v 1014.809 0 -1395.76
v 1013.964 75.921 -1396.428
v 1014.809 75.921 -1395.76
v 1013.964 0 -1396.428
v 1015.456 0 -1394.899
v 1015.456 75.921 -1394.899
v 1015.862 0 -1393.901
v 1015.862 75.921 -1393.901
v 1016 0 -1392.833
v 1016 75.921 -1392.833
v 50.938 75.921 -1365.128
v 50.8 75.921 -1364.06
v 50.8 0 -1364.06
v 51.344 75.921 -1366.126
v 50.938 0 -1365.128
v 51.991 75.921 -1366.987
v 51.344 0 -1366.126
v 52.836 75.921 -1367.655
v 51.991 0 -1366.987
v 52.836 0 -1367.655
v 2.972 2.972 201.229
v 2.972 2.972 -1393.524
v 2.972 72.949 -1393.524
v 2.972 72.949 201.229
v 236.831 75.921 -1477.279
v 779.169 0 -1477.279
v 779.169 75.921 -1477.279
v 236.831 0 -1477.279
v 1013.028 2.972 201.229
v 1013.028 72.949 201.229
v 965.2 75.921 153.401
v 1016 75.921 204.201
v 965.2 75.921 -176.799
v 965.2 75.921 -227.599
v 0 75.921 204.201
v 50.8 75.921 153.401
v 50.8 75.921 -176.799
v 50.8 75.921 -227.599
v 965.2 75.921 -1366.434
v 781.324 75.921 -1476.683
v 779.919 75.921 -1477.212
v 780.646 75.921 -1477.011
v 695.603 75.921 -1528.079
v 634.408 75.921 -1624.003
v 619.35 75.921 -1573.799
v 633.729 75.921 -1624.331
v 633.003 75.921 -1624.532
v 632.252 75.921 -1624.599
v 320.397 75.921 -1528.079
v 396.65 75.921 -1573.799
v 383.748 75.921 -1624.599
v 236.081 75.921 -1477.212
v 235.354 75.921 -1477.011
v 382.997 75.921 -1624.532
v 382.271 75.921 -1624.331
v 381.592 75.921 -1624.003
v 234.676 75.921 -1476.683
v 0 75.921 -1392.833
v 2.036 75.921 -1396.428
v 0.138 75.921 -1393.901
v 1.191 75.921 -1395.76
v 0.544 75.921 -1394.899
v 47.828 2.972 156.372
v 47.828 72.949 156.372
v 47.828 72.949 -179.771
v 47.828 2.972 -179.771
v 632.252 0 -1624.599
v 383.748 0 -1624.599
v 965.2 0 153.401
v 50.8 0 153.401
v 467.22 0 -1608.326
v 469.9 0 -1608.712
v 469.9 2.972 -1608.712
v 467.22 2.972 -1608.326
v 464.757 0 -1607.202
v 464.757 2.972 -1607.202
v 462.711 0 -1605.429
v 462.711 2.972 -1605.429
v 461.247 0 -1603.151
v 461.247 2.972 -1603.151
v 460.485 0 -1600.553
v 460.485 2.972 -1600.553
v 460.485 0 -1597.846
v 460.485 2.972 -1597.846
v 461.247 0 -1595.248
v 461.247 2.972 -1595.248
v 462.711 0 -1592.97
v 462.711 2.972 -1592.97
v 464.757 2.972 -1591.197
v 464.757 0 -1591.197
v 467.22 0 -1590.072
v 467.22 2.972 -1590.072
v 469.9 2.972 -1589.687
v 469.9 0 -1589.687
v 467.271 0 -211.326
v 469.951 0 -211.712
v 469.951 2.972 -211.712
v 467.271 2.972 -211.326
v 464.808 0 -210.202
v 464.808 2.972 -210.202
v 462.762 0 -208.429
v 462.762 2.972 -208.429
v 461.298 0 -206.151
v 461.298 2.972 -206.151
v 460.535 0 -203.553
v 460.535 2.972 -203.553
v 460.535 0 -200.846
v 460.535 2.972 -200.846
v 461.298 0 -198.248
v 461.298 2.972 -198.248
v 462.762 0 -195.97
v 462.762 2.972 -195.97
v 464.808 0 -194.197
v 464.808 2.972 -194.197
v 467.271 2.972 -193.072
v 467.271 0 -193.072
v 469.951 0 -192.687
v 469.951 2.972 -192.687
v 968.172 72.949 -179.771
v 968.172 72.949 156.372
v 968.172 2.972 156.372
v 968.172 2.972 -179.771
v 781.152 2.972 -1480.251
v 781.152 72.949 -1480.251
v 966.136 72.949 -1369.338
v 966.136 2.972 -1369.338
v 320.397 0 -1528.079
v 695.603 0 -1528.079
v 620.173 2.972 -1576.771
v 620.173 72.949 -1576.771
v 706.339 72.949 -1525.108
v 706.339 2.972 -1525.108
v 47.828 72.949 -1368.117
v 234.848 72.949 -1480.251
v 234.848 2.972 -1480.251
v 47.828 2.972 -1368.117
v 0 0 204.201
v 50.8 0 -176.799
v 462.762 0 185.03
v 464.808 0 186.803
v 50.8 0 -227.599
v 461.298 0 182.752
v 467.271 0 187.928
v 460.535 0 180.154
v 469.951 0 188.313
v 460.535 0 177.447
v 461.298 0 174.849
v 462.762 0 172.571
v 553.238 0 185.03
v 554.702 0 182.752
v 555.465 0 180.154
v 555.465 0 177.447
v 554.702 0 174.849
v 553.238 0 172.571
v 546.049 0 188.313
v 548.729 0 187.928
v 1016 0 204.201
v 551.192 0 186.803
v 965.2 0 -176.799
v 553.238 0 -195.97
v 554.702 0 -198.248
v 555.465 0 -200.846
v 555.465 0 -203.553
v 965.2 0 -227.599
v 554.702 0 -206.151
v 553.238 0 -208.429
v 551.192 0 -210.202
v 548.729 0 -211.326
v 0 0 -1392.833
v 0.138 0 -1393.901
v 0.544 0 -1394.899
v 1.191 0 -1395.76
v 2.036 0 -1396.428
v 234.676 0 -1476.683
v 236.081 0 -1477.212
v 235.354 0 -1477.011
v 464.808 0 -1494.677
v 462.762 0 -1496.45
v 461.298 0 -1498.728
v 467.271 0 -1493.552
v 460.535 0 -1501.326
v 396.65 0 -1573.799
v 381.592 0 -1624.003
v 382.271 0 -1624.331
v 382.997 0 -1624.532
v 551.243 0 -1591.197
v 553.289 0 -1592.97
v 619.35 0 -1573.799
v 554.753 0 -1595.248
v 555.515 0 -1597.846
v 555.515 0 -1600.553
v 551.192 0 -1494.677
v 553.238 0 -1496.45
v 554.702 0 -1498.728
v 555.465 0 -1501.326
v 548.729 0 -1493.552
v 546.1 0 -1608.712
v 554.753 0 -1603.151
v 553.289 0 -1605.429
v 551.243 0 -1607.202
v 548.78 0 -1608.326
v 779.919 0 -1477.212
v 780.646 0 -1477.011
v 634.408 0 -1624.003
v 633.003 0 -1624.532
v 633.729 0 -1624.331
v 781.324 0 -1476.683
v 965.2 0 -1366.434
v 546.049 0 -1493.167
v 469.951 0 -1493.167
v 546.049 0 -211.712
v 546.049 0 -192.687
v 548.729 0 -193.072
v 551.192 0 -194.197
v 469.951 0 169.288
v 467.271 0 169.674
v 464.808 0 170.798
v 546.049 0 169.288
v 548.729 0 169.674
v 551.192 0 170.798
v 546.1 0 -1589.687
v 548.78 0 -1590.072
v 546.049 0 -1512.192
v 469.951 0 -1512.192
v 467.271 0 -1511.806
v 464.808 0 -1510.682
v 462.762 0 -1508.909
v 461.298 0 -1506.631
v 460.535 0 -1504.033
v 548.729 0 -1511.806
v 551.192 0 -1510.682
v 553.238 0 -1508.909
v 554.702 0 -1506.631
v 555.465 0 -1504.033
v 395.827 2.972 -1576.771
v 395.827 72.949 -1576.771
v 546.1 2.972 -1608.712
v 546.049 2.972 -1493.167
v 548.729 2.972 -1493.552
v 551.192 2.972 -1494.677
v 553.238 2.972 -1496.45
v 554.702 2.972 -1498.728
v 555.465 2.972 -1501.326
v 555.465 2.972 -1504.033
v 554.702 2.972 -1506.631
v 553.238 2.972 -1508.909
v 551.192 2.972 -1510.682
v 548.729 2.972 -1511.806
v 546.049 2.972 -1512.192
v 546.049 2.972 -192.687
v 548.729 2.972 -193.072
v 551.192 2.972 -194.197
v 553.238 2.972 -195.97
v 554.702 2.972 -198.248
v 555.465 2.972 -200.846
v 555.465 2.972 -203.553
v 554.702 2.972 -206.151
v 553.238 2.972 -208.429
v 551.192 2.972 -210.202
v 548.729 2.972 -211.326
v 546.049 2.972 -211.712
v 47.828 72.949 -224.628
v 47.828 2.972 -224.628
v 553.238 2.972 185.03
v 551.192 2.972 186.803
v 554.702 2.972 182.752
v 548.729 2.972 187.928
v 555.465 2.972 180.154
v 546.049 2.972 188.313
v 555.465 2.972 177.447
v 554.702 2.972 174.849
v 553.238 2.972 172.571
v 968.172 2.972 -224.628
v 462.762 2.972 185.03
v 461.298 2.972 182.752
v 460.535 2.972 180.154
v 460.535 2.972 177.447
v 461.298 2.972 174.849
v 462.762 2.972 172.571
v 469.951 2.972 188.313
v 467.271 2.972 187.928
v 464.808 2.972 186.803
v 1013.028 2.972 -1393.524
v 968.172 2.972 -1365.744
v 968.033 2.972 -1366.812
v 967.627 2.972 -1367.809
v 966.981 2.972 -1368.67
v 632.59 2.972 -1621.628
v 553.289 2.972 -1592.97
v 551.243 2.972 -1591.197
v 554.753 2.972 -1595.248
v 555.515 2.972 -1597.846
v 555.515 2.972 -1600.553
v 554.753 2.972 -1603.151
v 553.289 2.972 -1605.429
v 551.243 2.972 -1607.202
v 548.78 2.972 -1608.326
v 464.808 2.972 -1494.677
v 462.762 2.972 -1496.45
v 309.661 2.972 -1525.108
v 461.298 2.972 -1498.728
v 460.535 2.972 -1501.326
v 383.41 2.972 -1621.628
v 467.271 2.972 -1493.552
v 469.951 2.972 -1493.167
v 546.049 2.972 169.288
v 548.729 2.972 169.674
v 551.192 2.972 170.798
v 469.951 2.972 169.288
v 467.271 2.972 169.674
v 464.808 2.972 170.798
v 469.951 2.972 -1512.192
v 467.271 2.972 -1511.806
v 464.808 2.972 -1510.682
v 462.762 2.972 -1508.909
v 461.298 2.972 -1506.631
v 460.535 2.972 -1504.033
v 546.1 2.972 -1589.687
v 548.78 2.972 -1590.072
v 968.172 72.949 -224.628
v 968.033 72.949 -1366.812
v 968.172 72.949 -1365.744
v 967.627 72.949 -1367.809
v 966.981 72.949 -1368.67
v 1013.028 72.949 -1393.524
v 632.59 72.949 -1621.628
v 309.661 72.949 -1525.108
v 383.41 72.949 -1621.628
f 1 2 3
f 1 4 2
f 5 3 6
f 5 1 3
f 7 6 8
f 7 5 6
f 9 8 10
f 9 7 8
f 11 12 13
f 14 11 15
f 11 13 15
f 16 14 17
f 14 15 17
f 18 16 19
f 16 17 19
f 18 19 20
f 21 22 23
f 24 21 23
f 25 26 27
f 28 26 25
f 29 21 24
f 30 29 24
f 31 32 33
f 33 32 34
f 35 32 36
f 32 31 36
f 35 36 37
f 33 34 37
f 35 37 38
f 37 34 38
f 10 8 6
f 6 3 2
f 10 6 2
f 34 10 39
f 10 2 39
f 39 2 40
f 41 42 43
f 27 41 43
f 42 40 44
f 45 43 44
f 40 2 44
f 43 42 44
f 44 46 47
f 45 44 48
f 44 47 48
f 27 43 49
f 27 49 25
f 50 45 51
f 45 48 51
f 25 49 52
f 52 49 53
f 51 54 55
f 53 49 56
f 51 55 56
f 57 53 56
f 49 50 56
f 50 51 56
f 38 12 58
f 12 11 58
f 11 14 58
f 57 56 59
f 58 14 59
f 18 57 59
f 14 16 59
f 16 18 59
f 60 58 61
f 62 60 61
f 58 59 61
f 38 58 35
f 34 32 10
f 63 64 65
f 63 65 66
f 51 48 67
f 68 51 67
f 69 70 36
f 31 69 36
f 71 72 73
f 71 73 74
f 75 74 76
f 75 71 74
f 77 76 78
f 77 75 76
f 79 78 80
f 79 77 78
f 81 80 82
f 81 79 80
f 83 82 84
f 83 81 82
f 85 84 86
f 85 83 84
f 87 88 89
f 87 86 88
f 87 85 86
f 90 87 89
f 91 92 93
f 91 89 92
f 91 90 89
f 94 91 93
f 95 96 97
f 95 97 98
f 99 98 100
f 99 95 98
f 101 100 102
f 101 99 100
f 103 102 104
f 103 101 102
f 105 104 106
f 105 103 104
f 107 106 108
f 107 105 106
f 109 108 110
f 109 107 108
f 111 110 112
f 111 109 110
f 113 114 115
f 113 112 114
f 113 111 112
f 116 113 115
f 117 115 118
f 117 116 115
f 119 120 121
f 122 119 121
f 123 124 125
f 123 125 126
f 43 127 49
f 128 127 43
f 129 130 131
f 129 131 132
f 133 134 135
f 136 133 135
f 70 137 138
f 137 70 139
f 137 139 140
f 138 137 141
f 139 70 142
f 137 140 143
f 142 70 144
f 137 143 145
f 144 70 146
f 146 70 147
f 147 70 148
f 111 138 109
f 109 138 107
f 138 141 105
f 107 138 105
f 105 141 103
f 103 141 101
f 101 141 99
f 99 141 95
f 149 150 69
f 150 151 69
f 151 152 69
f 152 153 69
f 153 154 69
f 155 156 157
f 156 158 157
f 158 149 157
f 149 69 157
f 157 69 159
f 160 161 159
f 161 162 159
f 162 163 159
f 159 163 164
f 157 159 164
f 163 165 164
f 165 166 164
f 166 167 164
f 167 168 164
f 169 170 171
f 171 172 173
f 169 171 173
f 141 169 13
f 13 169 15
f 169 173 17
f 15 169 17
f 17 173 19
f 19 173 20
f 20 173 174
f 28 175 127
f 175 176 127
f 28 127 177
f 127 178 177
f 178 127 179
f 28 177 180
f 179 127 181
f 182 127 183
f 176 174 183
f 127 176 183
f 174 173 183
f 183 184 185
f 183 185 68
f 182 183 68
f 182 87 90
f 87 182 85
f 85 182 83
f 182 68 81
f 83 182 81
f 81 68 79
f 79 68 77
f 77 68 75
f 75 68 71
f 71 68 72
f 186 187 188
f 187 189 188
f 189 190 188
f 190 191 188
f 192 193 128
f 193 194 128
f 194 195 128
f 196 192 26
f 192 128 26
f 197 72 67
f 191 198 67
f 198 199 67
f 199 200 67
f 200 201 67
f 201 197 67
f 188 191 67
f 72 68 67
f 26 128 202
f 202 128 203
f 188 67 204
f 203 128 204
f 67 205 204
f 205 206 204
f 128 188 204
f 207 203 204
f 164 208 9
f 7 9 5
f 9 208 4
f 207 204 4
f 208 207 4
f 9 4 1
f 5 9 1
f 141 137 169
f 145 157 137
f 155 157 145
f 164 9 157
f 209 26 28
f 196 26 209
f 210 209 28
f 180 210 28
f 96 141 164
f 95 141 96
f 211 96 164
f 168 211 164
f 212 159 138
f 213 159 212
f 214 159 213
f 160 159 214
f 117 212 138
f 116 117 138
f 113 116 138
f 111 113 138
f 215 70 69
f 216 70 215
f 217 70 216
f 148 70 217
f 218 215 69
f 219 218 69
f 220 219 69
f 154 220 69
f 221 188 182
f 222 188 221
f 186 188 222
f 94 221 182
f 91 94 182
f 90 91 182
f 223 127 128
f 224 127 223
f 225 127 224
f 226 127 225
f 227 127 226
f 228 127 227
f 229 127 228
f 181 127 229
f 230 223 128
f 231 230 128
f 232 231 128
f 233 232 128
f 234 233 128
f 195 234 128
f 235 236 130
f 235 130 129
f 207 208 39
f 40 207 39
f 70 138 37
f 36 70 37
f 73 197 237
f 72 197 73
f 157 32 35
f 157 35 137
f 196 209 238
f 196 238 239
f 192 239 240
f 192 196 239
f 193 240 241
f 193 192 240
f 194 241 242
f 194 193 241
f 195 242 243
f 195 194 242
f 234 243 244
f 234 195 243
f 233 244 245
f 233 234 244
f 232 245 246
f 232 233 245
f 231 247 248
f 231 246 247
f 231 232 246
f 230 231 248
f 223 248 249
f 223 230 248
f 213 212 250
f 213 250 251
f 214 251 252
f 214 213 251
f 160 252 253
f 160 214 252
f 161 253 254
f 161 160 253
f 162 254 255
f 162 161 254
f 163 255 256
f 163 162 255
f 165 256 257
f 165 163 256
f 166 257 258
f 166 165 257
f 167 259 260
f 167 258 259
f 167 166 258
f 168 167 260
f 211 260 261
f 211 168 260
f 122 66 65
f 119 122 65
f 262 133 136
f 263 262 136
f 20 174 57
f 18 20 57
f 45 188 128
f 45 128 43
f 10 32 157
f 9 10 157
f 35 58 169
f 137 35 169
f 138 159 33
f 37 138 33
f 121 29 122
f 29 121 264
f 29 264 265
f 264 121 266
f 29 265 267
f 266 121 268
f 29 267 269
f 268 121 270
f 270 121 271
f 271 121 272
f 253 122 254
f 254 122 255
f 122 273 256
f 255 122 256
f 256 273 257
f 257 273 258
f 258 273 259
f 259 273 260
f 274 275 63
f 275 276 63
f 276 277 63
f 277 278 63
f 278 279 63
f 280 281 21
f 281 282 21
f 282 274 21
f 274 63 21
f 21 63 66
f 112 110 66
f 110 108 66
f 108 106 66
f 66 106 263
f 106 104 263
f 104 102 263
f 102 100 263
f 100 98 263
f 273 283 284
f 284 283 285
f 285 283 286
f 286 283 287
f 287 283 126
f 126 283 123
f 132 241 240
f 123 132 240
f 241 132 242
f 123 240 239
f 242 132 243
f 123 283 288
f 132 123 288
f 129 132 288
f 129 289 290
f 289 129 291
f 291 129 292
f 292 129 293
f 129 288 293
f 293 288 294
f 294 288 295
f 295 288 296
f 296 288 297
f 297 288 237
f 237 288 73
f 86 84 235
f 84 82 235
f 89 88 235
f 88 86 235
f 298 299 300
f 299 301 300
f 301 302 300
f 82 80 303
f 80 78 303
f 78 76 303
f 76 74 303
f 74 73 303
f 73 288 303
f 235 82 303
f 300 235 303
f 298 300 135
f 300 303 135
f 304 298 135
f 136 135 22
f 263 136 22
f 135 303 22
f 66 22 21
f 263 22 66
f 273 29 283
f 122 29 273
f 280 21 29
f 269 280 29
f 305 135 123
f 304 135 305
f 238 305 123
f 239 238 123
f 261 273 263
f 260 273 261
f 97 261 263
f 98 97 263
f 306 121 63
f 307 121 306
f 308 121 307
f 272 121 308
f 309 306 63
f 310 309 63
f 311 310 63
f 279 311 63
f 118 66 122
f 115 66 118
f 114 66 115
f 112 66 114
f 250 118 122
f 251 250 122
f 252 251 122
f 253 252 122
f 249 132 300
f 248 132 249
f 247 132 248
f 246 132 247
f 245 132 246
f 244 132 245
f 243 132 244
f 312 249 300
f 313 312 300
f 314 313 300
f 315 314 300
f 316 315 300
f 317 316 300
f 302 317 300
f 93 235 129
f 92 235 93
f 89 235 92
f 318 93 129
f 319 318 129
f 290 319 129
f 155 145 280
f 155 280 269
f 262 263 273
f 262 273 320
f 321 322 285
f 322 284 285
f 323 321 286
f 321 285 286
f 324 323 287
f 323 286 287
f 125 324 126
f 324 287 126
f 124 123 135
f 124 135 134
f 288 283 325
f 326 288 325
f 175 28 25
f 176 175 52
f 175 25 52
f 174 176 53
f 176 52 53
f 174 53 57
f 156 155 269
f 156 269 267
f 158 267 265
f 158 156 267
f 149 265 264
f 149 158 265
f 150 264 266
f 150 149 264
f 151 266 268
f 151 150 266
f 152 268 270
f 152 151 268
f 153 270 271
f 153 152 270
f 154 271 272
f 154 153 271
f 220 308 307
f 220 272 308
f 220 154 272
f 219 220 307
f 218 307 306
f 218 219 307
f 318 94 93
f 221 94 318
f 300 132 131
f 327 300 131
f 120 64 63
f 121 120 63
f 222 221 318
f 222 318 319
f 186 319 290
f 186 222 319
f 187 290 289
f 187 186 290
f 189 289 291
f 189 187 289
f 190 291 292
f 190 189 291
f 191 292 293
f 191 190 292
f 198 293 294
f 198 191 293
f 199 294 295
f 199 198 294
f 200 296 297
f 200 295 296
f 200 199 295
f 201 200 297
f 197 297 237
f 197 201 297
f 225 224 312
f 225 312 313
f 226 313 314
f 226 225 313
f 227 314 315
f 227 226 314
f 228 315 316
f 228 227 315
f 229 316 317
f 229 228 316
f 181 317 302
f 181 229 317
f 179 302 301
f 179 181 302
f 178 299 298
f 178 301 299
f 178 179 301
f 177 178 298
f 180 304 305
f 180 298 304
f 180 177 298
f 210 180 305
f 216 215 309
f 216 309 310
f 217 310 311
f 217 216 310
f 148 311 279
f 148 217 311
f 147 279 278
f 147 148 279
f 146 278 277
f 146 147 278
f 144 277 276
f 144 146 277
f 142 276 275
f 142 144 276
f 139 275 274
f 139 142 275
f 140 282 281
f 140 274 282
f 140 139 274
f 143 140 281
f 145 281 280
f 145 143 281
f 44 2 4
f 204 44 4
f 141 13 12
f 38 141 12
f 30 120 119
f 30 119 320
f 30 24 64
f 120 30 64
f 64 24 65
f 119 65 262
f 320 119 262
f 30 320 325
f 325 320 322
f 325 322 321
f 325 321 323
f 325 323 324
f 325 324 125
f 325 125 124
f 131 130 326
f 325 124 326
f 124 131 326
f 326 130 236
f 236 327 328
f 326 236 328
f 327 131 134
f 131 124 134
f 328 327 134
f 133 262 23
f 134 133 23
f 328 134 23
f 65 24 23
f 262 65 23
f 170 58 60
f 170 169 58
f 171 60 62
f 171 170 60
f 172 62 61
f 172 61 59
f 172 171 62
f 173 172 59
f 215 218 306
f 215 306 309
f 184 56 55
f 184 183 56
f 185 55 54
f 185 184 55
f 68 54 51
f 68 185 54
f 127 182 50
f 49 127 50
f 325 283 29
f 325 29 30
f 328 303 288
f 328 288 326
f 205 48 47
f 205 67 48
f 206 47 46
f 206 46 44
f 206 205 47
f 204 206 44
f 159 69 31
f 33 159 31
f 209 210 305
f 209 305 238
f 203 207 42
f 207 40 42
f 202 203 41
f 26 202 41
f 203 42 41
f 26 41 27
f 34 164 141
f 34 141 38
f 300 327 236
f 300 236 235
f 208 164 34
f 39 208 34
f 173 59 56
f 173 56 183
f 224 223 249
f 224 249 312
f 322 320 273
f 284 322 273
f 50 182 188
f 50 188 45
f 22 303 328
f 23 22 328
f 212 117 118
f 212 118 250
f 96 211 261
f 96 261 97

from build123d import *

# Parameters (mm, degrees)
SKETCH2_W               = 50.8
SKETCH2_H               = 75.9206
SKETCH2_W_2             = 44.8564
SKETCH2_H_2             = 69.977
CUT_EXTRUDE1_DEPTH      = 25.4
CUT_EXTRUDE2_DEPTH      = 25.4
BOSS_EXTRUDE1_REACH     = 967.2
SKETCH7_W               = 50.8
SKETCH7_H               = 75.9206
CUT_EXTRUDE3_DEPTH      = 25.4
SKETCH11_W              = 44.8564
SKETCH11_H              = 69.977
CUT_EXTRUDE4_DEPTH      = 482.6
CUT_EXTRUDE4_DEPTH_BACK = 482.6
BOSS_EXTRUDE2_DEPTH     = 75.9206
SKETCH13_W              = 44.8564
SKETCH13_H              = 69.977
CUT_EXTRUDE5_DEPTH      = 279.4
CUT_EXTRUDE5_DEPTH_BACK = 279.4
CUT_EXTRUDE6_DEPTH      = 25.4
FILLET2_R               = 4.191
FILLET3_R               = 4.191


with BuildPart() as part:
    # Sweep1: sweep along a path in Sketch3
    with BuildLine(Plane(origin=(0, 0, 0), x_dir=(1, 0, 0), z_dir=(0, 1, 0))) as sweep1_path:
        Line((0, -204.200684232), (0, 1395.206939042))
        Line((0, 1395.206939042), (382.5875, 1624.599315768))
        Line((382.5875, 1624.599315768), (633.4125, 1624.599315768))
        Line((633.4125, 1624.599315768), (1016, 1395.206939042))
        Line((1016, 1395.206939042), (1016, -204.200684232))
        Line((1016, -204.200684232), (0, -204.200684232))
    # Sketch2 → Sweep1 (sweep)
    with BuildSketch(Plane.XY):
        with Locations((25.4, 37.9603)):
            Rectangle(SKETCH2_W, SKETCH2_H)
        with Locations((25.4, 37.9603)):
            Rectangle(SKETCH2_W_2, SKETCH2_H_2, mode=Mode.SUBTRACT)
    sweep(path=sweep1_path.line, transition=Transition.RIGHT)

    # Sketch4 → Cut-Extrude1 (cut)
    with BuildSketch(Plane.XZ):
        with BuildLine():
            Line((469.9508, 188.312984232), (546.0492, 188.312984232))
            ThreePointArc((546.0492, 188.312984232), (555.5615, 178.800684232), (546.0492, 169.288384232))
            Line((546.0492, 169.288384232), (469.9508, 169.288384232))
            ThreePointArc((469.9508, 169.288384232), (460.4385, 178.800684232), (469.9508, 188.312984232))
        make_face()
    extrude(amount=-CUT_EXTRUDE1_DEPTH, mode=Mode.SUBTRACT)

    # Sketch5 → Cut-Extrude2 (cut)
    with BuildSketch(Plane.XZ):
        with BuildLine():
            Line((469.9, -1589.687015768), (546.1, -1589.687015768))
            ThreePointArc((546.1, -1589.687015768), (555.6123, -1599.199315768), (546.1, -1608.711615768))
            Line((546.1, -1608.711615768), (469.9, -1608.711615768))
            ThreePointArc((469.9, -1608.711615768), (460.3877, -1599.199315768), (469.9, -1589.687015768))
        make_face()
    extrude(amount=-CUT_EXTRUDE2_DEPTH, mode=Mode.SUBTRACT)

    # Sketch7 → Boss-Extrude1 (add, up to next)
    with BuildSketch(Plane.ZY.offset(-965.2), mode=Mode.PRIVATE) as boss_extrude1_sk1:
        with Locations((-202.199315768, 37.9603)):
            Rectangle(SKETCH7_W, SKETCH7_H)
    boss_extrude1_tool1 = extrude(boss_extrude1_sk1.sketch, amount=BOSS_EXTRUDE1_REACH, mode=Mode.PRIVATE) - part.part
    add(boss_extrude1_tool1.solids().sort_by_distance((965.2, 37.9603, -202.199316))[0])

    # Sketch8 → Cut-Extrude3 (cut)
    with BuildSketch(Plane.XZ):
        with BuildLine():
            Line((469.9508, -192.687015768), (546.0492, -192.687015768))
            ThreePointArc((546.0492, -192.687015768), (555.5615, -202.199315768), (546.0492, -211.711615768))
            Line((546.0492, -211.711615768), (469.9508, -211.711615768))
            ThreePointArc((469.9508, -211.711615768), (460.4385, -202.199315768), (469.9508, -192.687015768))
        make_face()
    extrude(amount=-CUT_EXTRUDE3_DEPTH, mode=Mode.SUBTRACT)

    # Sketch11 → Cut-Extrude4 (cut, two sides)
    with BuildSketch(Plane(origin=(508, 0, 0), x_dir=(0, 0, -1), z_dir=(1, 0, 0))) as cut_extrude4_sk:
        with Locations((202.199315768, 37.9603)):
            Rectangle(SKETCH11_W, SKETCH11_H)
    extrude(amount=CUT_EXTRUDE4_DEPTH, mode=Mode.SUBTRACT)
    extrude(cut_extrude4_sk.sketch, amount=-CUT_EXTRUDE4_DEPTH_BACK, mode=Mode.SUBTRACT)

    # Sketch12 → Boss-Extrude2 (add)
    with BuildSketch(Plane(origin=(0, 0, 0), x_dir=(1, 0, 0), z_dir=(0, 1, 0))):
        Polygon((320.396677865, 1528.079315768), (695.603322135, 1528.079315768), (780.329088864, 1477.279315768), (235.670911136, 1477.279315768), align=None)
    extrude(amount=BOSS_EXTRUDE2_DEPTH)

    # Sketch13 → Cut-Extrude5 (cut, two sides)
    with BuildSketch(Plane(origin=(508, 0, 0), x_dir=(0, 0, -1), z_dir=(1, 0, 0))) as cut_extrude5_sk:
        with Locations((1502.679315768, 37.9603)):
            Rectangle(SKETCH13_W, SKETCH13_H)
    extrude(amount=CUT_EXTRUDE5_DEPTH, mode=Mode.SUBTRACT)
    extrude(cut_extrude5_sk.sketch, amount=-CUT_EXTRUDE5_DEPTH_BACK, mode=Mode.SUBTRACT)

    # Sketch14 → Cut-Extrude6 (cut)
    with BuildSketch(Plane.XZ):
        with BuildLine():
            Line((469.9508, -1493.167015768), (546.0492, -1493.167015768))
            ThreePointArc((546.0492, -1493.167015768), (555.5615, -1502.679315768), (546.0492, -1512.191615768))
            Line((546.0492, -1512.191615768), (469.9508, -1512.191615768))
            ThreePointArc((469.9508, -1512.191615768), (460.4385, -1502.679315768), (469.9508, -1493.167015768))
        make_face()
    extrude(amount=-CUT_EXTRUDE6_DEPTH, mode=Mode.SUBTRACT)

    # Fillet2
    fillet2_edges = [part.edges().sort_by_distance(p)[0] for p in [
        (1016, 37.9603, -1395.206939042),
        (0, 37.9603, -1395.206939042),
        (633.4125, 37.9603, -1624.599315768),
        (382.5875, 37.9603, -1624.599315768),
    ]]
    fillet(fillet2_edges, radius=FILLET2_R)

    # Fillet3
    fillet3_edges = [part.edges().sort_by_distance(p)[0] for p in [
        (235.670911136, 37.9603, -1477.279315768),
        (780.329088864, 37.9603, -1477.279315768),
        (50.8, 37.9603, -1366.434142591),
        (968.1718, 37.9603, -1368.117351183),
    ]]
    fillet(fillet3_edges, radius=FILLET3_R)


solid = part.part
